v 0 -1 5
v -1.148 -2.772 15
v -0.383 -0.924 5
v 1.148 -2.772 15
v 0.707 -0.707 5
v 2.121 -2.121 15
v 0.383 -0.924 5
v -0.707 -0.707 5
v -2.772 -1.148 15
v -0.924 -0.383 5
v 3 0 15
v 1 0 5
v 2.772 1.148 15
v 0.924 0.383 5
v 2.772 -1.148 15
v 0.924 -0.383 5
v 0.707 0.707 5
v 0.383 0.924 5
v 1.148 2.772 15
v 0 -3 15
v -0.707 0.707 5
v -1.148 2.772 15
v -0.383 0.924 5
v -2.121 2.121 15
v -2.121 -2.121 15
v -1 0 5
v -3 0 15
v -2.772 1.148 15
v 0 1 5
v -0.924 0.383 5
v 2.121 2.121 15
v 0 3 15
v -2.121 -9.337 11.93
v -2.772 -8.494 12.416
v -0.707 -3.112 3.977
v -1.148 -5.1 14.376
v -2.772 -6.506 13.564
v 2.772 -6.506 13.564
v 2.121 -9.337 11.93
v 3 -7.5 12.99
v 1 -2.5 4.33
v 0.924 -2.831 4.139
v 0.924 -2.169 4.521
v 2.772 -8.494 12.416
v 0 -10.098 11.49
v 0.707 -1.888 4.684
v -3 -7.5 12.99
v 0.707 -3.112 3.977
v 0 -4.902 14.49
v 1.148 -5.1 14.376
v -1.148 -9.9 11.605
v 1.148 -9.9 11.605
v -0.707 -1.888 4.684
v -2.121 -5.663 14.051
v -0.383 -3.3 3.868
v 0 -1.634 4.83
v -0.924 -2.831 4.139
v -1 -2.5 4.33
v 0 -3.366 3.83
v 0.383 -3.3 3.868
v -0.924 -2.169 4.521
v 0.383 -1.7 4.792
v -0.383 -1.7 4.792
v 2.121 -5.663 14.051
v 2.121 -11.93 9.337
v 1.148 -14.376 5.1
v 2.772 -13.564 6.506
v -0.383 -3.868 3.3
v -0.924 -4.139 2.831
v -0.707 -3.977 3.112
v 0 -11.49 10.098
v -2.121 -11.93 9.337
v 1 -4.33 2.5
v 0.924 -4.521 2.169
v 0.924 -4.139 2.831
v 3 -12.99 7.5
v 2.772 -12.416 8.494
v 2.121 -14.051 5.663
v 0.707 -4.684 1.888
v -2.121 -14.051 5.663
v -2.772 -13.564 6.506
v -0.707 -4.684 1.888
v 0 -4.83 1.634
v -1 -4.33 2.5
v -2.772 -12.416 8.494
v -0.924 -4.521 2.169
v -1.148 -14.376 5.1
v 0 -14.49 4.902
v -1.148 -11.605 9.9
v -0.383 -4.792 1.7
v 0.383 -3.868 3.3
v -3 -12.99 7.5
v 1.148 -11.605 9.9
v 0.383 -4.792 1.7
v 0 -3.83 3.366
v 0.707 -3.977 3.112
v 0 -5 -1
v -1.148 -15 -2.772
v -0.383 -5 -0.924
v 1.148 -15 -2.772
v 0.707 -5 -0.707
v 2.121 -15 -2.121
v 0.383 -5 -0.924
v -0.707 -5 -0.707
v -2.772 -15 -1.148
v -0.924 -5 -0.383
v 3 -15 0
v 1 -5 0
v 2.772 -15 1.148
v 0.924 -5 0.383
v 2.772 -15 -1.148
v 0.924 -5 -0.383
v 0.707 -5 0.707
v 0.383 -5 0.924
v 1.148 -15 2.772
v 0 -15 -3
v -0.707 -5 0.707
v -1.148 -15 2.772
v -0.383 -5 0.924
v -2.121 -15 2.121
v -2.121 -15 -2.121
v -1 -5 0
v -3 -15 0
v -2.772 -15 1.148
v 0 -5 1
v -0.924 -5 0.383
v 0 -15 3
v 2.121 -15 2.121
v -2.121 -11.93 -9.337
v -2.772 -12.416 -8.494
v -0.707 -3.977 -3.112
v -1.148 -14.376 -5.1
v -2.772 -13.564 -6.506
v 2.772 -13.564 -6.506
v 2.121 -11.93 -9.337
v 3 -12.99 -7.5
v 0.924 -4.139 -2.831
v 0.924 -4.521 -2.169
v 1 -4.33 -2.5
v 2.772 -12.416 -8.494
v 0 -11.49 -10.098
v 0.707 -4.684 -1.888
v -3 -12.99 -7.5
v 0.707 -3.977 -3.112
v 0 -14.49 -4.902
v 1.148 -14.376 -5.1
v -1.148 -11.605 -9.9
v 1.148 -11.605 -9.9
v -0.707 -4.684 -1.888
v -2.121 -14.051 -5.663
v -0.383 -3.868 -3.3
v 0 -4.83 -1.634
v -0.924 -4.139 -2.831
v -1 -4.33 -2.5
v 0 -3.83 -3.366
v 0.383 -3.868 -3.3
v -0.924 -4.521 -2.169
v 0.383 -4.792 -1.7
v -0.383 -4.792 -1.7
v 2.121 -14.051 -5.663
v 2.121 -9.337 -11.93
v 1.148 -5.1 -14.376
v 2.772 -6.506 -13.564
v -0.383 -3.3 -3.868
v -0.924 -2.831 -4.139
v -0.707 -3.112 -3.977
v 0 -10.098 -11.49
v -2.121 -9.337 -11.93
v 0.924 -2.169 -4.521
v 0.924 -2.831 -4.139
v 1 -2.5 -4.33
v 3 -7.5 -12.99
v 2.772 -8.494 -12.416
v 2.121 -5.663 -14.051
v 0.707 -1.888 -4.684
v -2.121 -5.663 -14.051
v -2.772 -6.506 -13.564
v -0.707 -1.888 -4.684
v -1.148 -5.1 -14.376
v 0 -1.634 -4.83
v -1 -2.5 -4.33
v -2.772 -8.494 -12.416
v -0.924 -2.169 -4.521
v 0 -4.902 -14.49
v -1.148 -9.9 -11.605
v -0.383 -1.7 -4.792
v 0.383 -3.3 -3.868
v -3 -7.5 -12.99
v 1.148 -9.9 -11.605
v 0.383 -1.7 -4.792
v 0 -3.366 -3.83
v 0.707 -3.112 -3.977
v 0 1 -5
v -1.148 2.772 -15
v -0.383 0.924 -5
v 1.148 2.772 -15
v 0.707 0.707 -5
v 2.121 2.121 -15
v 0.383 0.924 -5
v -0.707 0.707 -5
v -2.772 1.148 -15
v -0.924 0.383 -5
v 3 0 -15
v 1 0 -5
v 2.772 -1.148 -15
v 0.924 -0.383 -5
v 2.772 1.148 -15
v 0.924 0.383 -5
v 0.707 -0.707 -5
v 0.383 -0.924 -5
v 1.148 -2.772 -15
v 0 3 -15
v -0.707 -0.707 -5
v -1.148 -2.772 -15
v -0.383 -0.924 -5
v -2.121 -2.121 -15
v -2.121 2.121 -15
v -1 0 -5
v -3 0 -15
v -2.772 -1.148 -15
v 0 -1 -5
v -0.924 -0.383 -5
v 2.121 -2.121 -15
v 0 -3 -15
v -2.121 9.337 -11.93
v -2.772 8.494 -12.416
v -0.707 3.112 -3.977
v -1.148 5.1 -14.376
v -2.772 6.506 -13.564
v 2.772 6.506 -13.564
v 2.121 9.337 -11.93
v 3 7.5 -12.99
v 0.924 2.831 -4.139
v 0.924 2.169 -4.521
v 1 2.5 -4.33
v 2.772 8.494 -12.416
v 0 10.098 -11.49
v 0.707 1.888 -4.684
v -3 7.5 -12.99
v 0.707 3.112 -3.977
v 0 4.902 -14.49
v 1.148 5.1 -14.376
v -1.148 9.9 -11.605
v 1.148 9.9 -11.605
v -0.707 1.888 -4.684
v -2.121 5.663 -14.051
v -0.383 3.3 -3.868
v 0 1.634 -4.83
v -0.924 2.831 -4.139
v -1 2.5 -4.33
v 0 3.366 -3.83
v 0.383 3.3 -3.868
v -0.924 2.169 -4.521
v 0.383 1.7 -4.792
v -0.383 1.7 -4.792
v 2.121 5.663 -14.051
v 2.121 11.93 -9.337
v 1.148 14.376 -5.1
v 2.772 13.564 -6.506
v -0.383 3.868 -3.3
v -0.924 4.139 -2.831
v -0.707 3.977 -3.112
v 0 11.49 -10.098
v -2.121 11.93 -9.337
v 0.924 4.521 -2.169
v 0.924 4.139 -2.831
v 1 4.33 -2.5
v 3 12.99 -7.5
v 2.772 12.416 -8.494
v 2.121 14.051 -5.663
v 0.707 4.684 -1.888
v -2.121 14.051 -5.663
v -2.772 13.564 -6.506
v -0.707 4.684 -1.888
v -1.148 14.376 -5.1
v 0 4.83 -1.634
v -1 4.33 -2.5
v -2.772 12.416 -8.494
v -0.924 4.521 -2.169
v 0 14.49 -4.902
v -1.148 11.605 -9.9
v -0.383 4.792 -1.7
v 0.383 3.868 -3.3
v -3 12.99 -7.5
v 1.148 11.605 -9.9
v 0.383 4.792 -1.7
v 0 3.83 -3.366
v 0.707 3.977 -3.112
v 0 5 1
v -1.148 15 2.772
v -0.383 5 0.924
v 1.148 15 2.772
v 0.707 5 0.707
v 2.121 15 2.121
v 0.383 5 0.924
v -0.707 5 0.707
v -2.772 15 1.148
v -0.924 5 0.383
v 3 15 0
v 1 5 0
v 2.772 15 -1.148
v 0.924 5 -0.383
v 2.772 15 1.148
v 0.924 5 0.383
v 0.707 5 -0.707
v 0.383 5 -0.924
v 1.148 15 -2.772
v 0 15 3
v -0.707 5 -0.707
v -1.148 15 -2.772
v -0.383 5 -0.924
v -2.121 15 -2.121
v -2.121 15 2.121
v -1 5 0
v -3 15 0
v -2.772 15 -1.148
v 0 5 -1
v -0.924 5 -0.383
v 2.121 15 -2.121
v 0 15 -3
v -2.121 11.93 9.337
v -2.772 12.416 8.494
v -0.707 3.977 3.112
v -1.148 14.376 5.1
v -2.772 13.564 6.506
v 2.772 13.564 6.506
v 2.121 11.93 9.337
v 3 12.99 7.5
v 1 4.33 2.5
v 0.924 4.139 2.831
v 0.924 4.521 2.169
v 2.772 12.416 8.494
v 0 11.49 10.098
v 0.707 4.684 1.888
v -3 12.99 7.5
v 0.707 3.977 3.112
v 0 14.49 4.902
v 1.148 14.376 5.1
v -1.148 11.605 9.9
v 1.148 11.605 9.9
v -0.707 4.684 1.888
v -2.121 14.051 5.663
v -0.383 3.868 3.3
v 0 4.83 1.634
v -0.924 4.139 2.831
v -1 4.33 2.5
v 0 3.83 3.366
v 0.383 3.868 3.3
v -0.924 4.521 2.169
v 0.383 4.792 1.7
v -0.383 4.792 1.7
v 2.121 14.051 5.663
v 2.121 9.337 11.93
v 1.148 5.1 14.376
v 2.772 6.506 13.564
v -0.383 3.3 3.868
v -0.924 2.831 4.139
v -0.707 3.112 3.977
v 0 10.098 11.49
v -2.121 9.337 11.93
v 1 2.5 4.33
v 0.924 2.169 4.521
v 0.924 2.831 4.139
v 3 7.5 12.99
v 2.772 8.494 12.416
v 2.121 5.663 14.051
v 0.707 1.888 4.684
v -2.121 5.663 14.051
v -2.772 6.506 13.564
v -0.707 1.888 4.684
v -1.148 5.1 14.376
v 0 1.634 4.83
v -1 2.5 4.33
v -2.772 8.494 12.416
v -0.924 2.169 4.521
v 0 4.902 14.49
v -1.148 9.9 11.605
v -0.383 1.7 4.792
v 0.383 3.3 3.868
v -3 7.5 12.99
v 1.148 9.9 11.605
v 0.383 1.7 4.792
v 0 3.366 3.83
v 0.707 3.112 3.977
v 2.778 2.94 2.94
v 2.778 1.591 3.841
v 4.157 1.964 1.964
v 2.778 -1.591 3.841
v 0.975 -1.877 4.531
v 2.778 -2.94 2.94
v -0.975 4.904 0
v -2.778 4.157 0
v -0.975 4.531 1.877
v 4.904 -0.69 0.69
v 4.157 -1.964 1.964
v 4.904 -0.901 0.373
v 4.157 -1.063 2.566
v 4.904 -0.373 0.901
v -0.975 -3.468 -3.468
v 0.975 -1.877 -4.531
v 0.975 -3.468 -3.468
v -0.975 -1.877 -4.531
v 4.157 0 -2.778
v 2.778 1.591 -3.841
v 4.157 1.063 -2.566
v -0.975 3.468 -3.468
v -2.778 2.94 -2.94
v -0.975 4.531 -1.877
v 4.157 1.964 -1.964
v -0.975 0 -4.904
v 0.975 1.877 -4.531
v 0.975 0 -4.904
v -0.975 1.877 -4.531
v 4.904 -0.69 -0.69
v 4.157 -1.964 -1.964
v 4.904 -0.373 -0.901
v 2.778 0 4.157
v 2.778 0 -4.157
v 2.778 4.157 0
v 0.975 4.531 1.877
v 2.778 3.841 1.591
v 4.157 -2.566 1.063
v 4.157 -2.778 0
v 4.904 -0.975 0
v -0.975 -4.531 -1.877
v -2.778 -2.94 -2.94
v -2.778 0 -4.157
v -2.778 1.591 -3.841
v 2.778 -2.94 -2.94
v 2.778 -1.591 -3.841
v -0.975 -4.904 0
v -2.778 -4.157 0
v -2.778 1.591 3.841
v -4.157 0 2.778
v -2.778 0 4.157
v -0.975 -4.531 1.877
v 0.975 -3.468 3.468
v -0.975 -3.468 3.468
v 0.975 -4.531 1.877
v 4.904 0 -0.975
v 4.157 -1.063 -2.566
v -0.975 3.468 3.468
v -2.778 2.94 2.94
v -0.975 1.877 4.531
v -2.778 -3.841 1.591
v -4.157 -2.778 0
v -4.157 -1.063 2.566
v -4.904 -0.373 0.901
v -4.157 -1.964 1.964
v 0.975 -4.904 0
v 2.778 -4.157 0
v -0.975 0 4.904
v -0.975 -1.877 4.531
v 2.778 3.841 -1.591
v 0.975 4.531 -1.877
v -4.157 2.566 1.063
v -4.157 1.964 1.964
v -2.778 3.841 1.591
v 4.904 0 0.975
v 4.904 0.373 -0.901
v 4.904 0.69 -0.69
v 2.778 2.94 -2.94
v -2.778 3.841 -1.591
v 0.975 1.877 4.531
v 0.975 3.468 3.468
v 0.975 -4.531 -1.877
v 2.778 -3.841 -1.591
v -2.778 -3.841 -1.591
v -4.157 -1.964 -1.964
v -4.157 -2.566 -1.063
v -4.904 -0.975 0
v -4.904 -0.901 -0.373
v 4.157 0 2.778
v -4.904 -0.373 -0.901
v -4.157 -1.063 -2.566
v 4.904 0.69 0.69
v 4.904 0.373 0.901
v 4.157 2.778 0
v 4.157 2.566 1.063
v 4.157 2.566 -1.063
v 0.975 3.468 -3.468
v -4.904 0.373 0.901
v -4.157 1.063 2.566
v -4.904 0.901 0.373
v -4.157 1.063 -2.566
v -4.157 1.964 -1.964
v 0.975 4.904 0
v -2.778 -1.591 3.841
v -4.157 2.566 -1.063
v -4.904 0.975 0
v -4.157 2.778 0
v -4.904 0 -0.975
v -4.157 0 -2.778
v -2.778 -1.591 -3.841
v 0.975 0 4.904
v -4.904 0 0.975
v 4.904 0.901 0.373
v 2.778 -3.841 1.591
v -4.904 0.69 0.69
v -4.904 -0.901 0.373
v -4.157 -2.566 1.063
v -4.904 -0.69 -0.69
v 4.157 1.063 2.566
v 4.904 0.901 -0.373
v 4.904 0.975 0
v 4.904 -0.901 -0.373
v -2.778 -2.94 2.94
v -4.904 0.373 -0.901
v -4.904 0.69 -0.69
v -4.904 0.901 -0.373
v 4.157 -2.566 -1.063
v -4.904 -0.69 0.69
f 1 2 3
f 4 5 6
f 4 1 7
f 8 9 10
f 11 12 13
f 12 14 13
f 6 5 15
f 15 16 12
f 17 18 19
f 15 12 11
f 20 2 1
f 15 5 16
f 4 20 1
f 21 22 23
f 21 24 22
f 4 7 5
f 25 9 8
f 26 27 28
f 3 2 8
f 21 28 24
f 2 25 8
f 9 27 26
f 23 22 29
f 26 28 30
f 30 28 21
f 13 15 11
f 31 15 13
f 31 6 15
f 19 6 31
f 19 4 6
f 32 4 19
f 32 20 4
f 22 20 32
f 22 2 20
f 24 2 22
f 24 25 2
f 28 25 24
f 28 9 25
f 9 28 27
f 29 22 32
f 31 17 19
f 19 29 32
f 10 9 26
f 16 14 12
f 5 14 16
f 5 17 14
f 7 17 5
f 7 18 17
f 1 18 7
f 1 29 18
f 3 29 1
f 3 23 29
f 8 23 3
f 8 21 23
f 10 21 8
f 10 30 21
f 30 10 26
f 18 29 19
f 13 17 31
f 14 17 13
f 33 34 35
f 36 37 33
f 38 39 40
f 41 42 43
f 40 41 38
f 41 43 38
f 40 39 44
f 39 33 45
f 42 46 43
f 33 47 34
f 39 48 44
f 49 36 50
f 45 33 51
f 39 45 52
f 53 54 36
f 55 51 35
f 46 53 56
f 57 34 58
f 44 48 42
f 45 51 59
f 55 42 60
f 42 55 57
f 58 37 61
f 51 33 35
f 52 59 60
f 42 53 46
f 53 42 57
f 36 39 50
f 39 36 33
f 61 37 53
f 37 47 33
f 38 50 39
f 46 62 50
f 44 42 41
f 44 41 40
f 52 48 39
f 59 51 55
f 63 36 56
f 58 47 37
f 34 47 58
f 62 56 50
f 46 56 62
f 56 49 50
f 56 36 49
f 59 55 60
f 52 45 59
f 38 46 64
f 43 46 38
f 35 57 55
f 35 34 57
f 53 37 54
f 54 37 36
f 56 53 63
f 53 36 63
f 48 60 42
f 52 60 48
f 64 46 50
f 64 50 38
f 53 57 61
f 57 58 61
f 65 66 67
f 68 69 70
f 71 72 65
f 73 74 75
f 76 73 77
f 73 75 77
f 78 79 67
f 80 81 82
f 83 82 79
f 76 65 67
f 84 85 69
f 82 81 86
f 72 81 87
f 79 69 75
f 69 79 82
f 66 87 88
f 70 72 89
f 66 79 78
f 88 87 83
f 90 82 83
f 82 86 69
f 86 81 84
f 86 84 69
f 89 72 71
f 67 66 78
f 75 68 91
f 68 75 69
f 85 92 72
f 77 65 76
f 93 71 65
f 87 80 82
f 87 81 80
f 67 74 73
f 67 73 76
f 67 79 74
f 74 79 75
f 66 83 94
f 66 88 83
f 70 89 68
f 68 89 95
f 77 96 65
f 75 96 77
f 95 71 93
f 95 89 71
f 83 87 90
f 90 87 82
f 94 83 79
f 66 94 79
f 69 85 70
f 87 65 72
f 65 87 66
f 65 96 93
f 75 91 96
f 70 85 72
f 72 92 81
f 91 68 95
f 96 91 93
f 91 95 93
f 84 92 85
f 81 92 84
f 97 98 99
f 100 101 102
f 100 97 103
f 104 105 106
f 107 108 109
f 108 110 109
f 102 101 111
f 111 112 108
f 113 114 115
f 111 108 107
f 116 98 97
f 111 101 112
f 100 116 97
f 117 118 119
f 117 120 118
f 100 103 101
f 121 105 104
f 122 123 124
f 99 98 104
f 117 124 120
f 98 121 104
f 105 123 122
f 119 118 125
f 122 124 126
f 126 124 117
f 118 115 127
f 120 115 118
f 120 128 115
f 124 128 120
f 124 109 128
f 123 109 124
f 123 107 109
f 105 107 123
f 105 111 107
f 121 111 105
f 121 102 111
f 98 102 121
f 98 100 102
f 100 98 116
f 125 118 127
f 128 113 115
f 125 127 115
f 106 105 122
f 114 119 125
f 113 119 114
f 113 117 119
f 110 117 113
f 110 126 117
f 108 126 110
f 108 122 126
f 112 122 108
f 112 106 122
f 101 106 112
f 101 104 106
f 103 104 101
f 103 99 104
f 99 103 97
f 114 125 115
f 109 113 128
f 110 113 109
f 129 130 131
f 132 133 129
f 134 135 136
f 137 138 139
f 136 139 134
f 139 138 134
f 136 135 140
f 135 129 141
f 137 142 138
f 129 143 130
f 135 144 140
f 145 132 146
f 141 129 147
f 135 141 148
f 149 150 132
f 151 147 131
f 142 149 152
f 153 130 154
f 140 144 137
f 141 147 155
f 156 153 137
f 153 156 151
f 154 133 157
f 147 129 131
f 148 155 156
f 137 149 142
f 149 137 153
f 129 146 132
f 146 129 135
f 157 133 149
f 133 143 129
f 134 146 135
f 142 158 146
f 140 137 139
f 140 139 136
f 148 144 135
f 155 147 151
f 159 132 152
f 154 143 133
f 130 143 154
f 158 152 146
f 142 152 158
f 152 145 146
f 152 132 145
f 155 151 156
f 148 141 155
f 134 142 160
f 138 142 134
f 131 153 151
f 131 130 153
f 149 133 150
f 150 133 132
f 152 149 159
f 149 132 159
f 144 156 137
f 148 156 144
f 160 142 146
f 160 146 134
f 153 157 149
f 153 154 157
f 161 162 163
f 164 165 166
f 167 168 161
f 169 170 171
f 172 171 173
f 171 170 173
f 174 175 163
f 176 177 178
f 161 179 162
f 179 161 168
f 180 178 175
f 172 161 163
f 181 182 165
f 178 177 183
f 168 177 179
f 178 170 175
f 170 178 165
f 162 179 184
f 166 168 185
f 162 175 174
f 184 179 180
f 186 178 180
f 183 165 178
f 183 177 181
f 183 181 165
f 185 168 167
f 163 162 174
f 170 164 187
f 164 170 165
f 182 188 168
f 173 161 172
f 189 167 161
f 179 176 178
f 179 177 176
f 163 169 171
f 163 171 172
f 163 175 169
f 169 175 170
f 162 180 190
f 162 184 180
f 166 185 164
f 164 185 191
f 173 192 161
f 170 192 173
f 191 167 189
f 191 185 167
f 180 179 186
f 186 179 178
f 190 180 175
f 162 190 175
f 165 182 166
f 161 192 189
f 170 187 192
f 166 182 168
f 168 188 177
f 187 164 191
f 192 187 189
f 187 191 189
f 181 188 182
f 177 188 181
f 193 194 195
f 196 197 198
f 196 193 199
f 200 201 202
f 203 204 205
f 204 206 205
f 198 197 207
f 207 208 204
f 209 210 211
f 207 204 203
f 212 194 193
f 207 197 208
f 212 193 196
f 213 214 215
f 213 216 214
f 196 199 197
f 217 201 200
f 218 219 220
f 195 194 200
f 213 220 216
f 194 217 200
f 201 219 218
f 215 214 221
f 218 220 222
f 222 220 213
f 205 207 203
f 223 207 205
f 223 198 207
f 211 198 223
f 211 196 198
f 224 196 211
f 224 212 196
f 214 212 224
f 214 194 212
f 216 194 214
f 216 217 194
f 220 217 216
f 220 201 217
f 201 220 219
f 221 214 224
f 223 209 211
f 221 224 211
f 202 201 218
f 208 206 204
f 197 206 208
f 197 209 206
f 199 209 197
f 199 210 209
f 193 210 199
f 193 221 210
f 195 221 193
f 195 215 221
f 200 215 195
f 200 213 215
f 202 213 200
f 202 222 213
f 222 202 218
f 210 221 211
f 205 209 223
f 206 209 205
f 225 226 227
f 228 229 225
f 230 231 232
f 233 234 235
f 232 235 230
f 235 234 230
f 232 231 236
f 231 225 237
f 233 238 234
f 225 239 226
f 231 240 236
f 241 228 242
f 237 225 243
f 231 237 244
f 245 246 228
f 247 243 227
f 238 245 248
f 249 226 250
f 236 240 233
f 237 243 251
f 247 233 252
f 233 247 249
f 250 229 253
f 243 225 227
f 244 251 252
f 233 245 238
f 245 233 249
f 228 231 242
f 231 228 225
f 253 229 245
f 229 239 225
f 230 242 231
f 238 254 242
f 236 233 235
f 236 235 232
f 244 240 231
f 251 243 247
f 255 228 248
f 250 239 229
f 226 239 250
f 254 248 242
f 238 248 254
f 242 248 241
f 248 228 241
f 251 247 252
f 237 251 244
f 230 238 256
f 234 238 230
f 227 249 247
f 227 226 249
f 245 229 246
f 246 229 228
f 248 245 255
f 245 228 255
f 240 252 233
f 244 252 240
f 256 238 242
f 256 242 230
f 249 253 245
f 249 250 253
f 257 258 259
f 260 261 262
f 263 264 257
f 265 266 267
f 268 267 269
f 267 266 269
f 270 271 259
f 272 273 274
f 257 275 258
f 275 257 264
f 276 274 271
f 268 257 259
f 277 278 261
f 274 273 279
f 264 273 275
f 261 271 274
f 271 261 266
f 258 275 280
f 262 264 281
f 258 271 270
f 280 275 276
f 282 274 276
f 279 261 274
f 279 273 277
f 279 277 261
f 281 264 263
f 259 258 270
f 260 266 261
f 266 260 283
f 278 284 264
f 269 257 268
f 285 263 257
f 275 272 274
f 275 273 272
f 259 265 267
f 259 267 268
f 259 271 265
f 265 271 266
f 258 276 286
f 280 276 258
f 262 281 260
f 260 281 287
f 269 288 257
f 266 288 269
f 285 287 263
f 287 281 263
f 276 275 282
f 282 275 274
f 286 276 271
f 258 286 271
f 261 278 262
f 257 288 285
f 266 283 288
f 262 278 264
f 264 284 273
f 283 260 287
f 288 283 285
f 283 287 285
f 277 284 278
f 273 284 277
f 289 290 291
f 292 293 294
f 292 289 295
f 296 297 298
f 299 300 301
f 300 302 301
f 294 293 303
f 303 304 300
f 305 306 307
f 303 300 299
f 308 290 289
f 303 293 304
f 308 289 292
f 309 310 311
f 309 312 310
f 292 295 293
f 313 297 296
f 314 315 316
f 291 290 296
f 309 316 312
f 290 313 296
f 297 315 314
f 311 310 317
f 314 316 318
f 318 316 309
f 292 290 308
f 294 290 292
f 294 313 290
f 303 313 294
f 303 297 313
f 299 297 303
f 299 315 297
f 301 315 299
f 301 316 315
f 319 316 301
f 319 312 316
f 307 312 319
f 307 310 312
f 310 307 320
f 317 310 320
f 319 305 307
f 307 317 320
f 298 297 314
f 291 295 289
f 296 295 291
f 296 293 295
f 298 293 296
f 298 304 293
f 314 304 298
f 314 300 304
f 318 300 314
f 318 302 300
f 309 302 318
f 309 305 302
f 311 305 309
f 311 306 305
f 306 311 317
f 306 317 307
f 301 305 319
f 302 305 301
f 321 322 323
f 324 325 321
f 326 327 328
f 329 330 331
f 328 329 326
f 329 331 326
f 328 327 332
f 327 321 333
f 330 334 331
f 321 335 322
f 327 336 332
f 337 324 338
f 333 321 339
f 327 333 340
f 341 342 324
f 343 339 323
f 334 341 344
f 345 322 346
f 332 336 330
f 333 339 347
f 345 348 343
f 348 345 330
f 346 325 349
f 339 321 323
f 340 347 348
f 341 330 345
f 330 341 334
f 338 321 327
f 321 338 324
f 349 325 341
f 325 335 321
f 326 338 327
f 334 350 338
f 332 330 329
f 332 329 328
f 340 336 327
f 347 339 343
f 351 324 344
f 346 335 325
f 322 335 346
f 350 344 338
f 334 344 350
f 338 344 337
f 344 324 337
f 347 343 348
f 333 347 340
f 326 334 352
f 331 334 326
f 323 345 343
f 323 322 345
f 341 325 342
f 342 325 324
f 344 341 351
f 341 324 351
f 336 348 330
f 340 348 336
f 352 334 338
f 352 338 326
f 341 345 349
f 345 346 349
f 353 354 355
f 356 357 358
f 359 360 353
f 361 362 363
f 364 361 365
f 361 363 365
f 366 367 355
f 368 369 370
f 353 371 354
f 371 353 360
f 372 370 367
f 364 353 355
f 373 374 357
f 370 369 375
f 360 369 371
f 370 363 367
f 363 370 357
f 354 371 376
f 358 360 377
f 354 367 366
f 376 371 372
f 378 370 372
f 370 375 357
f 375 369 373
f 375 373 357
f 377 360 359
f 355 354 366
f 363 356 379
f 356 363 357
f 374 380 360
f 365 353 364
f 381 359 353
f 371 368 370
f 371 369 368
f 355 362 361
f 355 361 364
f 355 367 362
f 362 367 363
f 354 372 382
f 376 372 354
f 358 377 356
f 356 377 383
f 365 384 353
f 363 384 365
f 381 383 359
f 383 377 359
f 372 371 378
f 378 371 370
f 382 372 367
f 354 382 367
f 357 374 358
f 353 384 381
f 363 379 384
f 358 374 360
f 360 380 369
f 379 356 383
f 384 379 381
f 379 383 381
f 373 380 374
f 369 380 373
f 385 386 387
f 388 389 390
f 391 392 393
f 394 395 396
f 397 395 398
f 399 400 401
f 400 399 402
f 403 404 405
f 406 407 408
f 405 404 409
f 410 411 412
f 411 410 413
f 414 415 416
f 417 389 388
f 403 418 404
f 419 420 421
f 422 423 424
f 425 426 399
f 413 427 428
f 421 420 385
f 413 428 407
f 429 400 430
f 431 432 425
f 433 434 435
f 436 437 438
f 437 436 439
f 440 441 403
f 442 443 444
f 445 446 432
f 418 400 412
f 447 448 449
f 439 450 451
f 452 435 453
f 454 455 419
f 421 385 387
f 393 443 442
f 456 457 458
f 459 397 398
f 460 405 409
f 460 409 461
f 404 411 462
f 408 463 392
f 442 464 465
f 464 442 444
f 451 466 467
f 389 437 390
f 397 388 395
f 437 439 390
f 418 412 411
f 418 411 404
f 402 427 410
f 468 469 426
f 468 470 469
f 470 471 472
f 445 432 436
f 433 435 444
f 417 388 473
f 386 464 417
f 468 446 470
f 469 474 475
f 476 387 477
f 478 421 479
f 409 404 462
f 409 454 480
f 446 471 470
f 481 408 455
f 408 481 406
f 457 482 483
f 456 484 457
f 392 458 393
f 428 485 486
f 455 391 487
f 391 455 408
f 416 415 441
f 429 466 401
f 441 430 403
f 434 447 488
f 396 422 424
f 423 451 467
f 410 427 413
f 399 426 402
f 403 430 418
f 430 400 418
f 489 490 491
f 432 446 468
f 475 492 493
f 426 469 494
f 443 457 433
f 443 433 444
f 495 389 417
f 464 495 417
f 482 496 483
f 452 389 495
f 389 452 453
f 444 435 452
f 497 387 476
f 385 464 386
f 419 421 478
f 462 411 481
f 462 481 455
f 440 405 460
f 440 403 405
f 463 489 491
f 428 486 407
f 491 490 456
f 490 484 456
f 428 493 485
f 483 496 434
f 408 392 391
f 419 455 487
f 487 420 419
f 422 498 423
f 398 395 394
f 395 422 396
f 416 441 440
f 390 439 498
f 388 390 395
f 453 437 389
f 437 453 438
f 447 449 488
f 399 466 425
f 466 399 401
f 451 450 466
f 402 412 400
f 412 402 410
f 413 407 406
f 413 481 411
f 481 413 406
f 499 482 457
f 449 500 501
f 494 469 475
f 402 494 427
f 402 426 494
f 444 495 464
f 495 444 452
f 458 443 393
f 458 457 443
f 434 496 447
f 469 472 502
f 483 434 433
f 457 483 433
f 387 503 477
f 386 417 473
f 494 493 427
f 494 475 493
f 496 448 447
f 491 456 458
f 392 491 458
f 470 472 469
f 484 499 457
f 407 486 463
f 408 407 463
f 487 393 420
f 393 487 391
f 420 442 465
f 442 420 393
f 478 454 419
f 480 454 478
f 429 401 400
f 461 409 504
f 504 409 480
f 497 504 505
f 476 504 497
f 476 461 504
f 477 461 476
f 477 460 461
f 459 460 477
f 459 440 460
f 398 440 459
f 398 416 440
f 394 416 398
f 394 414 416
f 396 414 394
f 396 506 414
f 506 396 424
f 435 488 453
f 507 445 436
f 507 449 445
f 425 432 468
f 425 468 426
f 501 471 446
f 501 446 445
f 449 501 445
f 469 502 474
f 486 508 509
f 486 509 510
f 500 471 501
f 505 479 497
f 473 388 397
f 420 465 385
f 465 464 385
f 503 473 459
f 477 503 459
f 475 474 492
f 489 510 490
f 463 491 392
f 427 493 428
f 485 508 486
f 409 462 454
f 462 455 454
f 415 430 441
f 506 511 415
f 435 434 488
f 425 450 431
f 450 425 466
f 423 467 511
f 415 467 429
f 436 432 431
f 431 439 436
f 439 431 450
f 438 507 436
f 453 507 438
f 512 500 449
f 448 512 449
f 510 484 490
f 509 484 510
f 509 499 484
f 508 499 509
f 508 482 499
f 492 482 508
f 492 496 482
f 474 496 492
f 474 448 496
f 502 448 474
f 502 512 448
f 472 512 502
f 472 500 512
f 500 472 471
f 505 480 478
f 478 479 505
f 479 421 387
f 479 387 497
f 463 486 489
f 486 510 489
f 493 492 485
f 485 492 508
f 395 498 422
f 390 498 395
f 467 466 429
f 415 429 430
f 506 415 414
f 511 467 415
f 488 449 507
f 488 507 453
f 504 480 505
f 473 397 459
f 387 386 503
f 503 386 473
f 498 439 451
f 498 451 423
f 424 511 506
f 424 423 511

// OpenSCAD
$fn = 32; 

  

rotate(a=90, v=[0,1,0]) 

sphere(5); 

$fn = 16; 

for (i = [0:30:330]){ 

	echo(i) 

	rotate(a=i,v=[1,0,0]) 

	translate([0,0,5]) 

	cylinder(h=10, r1=1, r2 = 3); 

} 
